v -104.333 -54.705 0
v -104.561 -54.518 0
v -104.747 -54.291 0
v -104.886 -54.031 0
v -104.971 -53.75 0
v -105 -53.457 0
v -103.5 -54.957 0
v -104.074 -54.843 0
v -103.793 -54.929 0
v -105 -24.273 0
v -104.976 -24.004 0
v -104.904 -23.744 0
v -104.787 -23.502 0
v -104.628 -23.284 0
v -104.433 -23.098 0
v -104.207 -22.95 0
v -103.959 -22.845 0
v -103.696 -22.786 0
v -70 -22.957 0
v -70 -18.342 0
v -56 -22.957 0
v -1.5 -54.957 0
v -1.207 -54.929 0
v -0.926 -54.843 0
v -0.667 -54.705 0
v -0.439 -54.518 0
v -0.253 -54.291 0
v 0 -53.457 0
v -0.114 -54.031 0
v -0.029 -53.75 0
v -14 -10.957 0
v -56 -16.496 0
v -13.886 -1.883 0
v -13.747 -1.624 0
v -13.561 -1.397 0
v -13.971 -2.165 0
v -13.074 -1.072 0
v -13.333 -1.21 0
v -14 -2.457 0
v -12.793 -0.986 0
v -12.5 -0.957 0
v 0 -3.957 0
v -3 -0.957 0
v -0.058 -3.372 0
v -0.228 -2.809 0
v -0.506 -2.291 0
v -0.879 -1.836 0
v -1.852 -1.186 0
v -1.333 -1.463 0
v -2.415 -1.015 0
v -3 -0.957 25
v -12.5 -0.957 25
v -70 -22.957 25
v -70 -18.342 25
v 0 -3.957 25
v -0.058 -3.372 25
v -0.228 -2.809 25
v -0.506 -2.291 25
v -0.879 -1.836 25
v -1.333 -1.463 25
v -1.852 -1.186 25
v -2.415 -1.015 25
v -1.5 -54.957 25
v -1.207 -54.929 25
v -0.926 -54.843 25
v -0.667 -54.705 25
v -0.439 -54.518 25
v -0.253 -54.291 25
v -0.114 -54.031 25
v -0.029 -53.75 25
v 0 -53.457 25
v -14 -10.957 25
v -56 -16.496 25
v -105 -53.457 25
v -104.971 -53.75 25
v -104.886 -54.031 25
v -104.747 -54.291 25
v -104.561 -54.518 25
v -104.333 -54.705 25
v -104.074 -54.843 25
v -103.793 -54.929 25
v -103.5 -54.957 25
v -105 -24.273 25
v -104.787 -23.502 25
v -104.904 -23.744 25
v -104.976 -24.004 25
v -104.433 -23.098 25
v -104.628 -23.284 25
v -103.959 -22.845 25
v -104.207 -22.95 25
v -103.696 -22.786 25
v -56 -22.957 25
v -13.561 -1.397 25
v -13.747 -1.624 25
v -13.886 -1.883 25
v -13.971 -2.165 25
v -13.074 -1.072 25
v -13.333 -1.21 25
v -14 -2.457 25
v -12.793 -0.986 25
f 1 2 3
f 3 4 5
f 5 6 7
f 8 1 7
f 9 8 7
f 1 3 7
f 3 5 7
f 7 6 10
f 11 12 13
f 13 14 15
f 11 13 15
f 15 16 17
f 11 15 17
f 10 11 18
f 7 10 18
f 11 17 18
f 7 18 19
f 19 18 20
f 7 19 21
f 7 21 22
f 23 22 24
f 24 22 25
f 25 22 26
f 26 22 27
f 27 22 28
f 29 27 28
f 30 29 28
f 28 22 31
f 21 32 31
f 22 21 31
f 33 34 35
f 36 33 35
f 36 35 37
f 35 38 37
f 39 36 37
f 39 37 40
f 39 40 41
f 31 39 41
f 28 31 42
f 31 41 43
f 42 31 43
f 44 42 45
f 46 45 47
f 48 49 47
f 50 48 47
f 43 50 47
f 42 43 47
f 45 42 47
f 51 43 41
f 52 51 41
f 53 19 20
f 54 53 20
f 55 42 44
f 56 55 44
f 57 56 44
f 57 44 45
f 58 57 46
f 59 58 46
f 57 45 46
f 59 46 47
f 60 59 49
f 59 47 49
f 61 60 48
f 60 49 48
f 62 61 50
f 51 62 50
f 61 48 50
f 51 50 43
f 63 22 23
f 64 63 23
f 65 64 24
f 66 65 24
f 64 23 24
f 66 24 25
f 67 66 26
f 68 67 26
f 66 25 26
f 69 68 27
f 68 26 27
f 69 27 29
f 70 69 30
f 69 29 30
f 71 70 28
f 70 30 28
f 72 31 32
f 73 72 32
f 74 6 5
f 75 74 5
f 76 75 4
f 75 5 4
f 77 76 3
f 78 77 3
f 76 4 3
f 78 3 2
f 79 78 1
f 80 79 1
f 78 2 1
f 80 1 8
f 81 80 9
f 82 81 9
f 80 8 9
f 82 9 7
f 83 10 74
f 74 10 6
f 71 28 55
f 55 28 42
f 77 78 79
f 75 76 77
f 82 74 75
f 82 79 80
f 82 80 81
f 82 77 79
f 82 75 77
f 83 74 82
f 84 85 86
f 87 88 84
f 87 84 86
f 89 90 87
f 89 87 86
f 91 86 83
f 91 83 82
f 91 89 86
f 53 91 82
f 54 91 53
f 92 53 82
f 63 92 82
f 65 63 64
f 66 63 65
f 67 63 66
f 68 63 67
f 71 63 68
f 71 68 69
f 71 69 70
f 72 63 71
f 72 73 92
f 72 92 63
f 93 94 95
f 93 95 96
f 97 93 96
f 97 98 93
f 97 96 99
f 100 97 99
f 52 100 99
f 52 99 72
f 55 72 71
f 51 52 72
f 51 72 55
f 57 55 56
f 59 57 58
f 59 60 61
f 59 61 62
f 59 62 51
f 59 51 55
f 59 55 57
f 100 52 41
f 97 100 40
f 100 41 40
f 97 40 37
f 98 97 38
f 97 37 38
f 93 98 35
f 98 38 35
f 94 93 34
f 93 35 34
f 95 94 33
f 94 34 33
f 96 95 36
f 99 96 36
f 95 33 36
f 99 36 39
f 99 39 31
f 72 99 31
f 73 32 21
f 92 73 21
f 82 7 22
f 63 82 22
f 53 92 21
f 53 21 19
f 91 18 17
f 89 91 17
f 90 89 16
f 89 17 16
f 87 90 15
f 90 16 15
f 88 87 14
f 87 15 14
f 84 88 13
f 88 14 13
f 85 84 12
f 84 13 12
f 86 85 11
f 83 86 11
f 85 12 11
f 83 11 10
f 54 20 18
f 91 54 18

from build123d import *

# Parameters (mm, degrees)
F1_DEPTH = 25


with BuildPart() as f1:
    # F0 (on Top) → F1 (new body)
    with BuildSketch(Plane.XY):
        with BuildLine():
            ThreePointArc((-105, -53.457447), (-104.56066, -54.518107), (-103.5, -54.957447))
            Line((-103.5, -54.957447), (-56, -54.957447))
            Line((-56, -54.957447), (-1.5, -54.957447))
            ThreePointArc((-1.5, -54.957447), (-0.43934, -54.518107), (0, -53.457447))
            Line((0, -53.457447), (0, -3.957447))
            ThreePointArc((0, -3.957447), (-0.87868, -1.836126), (-3, -0.957447))
            Line((-3, -0.957447), (-12.5, -0.957447))
            ThreePointArc((-12.5, -0.957447), (-13.56066, -1.396786), (-14, -2.457447))
            Line((-14, -2.457447), (-14, -10.957447))
            Line((-14, -10.957447), (-56, -16.495908))
            Line((-56, -16.495908), (-56, -22.957447))
            Line((-56, -22.957447), (-70, -22.957447))
            Line((-70, -22.957447), (-70, -18.342062))
            Line((-70, -18.342062), (-103.696104, -22.785504))
            ThreePointArc((-103.696104, -22.785504), (-104.627865, -23.283731), (-105, -24.27263))
            Line((-105, -24.27263), (-105, -53.457447))
        make_face()
    extrude(amount=F1_DEPTH)


solid = f1.part
